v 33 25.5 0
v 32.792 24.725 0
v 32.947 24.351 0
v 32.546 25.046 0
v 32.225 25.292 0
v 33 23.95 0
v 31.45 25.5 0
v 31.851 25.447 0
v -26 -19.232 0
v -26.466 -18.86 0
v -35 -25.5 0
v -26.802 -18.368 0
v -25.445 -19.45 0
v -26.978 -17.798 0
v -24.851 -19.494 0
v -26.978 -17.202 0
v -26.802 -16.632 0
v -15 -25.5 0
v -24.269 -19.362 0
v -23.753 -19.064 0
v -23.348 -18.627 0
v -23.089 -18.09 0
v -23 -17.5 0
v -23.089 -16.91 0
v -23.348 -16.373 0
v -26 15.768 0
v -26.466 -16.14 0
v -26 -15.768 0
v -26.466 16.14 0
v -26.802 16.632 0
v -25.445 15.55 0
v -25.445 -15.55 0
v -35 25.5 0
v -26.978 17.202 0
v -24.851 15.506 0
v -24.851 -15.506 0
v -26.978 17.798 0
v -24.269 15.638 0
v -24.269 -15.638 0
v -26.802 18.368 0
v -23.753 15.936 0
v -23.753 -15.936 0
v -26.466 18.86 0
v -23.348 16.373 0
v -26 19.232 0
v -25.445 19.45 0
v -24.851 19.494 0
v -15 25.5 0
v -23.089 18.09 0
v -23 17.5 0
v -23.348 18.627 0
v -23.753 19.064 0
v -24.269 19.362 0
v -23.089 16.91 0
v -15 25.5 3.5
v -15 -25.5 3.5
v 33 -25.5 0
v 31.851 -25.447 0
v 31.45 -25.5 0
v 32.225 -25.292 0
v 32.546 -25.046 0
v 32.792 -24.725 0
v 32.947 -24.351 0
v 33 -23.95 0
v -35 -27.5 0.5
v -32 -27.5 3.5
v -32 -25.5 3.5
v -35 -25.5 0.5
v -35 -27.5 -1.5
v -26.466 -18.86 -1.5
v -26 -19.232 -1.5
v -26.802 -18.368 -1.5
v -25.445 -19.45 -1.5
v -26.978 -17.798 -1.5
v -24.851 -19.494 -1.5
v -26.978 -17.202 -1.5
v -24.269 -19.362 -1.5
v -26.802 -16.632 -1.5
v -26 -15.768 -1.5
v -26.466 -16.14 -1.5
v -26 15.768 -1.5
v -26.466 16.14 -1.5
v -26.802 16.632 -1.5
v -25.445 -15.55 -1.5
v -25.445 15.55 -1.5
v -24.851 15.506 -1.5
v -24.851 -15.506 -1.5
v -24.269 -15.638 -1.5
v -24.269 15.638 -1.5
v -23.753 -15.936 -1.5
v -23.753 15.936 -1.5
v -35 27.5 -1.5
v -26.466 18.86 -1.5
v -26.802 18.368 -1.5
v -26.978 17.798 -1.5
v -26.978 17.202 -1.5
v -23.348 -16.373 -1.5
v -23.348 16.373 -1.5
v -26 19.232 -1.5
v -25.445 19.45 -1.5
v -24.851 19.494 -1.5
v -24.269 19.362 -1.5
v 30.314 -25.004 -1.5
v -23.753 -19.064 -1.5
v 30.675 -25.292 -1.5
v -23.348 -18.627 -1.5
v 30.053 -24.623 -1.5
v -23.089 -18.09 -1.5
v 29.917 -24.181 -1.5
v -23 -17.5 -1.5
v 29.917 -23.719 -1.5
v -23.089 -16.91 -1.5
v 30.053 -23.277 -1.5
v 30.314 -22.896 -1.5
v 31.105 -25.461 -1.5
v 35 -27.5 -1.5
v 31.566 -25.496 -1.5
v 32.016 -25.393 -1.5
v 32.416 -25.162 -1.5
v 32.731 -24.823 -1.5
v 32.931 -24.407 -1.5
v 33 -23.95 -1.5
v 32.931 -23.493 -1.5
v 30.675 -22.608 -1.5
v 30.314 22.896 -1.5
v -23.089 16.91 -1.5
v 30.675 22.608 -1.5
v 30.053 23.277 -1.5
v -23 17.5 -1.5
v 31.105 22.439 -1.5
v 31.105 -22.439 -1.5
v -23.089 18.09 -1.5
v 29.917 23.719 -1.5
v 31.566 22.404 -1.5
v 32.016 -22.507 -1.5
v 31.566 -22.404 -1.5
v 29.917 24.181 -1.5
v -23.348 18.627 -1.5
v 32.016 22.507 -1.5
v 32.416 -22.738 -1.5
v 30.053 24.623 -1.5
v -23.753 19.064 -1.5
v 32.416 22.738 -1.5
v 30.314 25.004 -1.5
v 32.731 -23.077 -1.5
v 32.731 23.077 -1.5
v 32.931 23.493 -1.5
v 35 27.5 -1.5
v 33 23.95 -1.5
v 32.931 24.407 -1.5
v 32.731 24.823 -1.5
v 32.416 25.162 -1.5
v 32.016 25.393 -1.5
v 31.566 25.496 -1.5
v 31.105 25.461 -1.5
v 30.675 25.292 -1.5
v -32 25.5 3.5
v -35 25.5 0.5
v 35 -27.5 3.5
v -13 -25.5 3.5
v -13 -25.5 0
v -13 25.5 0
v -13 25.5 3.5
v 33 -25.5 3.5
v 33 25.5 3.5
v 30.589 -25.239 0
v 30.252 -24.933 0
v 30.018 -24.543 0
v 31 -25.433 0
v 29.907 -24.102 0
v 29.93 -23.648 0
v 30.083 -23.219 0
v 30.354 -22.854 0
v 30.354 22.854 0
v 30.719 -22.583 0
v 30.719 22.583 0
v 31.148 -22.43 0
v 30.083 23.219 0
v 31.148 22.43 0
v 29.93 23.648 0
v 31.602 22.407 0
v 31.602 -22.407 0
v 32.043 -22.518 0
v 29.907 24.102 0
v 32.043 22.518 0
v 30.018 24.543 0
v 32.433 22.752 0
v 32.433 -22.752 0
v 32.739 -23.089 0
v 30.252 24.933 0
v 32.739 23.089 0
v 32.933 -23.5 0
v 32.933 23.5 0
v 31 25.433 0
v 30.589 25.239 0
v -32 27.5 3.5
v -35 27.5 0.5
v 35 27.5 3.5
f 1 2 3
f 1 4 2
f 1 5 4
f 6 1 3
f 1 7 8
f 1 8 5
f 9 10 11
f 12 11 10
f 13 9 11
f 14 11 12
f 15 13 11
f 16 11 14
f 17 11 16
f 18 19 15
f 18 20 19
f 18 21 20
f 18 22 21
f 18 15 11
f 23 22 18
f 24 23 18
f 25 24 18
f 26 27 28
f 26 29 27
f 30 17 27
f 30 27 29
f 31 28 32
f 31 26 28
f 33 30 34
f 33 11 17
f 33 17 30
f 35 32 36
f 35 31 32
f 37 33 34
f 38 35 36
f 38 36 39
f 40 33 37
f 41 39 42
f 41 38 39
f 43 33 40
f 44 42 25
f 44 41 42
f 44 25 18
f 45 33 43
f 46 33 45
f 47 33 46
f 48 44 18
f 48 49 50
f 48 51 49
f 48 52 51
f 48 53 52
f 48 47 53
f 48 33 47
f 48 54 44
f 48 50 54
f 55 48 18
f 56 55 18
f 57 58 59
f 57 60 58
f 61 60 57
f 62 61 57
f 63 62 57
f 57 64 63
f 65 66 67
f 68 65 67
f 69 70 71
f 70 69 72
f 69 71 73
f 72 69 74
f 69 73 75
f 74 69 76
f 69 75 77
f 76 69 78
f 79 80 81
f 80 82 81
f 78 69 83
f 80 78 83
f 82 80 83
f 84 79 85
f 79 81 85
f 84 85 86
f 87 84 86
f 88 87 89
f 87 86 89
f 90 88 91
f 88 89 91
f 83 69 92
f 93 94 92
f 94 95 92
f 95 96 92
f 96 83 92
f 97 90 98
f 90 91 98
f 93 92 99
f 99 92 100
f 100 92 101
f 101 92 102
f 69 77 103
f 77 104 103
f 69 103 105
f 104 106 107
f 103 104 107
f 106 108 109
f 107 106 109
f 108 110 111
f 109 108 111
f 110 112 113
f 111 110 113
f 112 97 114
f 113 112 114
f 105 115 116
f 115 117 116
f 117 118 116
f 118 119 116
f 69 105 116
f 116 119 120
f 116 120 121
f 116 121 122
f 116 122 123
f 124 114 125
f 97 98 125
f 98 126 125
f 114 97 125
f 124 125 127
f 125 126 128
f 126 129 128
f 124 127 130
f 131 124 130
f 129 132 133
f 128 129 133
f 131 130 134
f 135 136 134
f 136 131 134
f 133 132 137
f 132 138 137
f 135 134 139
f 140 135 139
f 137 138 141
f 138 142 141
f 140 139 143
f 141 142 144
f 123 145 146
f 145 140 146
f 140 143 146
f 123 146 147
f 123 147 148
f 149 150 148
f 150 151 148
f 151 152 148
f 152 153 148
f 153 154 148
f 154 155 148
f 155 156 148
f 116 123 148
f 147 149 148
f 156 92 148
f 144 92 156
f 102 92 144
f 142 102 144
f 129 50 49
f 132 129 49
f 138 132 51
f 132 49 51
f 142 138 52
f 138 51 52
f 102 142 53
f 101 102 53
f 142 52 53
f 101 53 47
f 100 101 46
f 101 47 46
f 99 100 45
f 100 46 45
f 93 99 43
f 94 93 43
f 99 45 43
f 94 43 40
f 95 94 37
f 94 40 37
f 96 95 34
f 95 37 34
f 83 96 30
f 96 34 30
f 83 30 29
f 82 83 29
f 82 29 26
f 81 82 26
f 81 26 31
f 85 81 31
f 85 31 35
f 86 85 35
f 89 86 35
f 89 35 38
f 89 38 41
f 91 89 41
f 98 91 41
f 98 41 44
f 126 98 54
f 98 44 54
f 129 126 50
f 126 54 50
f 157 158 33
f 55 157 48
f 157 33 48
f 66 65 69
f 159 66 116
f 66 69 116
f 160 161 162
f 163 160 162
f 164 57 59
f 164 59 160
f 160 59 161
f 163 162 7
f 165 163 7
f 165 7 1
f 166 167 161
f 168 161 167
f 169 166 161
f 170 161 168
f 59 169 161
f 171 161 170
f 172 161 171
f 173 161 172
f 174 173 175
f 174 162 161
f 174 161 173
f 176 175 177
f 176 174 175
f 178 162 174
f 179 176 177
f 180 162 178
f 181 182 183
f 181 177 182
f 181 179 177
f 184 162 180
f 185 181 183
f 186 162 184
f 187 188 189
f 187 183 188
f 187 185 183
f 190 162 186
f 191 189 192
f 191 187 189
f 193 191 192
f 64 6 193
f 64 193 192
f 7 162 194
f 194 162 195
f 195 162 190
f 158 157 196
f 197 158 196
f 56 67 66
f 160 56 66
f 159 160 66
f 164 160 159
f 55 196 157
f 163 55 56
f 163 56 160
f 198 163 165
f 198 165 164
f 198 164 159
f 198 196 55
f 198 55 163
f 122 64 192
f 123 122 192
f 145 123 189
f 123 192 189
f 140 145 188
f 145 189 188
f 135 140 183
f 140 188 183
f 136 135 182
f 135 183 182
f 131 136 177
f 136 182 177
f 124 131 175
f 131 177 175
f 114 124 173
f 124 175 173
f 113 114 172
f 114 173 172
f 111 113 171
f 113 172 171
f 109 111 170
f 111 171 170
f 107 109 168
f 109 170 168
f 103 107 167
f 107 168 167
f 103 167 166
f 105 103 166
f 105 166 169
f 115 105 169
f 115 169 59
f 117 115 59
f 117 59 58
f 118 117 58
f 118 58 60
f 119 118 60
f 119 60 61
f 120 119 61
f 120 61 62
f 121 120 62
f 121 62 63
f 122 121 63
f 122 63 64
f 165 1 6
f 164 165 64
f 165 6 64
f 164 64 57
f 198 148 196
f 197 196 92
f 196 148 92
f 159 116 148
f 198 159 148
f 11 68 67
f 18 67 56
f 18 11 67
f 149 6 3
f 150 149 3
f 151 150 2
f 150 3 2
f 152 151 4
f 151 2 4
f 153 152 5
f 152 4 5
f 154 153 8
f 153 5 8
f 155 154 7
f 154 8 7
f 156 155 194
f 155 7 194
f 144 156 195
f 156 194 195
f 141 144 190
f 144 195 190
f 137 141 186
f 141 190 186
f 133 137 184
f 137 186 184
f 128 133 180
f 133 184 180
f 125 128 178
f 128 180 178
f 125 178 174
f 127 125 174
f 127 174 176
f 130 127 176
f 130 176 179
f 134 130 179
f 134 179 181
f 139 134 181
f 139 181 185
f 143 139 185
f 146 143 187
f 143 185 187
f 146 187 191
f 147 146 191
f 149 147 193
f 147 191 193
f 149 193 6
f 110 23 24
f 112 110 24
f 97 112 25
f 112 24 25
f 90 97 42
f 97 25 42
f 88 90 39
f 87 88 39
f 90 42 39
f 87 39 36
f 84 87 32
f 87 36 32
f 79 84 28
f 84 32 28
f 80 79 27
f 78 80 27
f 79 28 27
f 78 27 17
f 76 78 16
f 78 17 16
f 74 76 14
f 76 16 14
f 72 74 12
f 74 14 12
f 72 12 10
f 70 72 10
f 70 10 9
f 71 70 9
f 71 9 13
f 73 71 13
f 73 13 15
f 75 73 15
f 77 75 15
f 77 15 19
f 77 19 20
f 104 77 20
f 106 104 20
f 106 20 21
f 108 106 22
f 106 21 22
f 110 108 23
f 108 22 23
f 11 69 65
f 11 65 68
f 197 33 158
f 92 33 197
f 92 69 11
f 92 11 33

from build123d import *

# Parameters (mm, degrees)
F0_W     = 70
F0_H     = 55
F0_R     = 2
F0_R_2   = 1.55
F1_DEPTH = 1.5
F2_W     = 2
F2_H     = 51
F2_H_2   = 2
F2_W_2   = 20
F3_DEPTH = 3.5
F4_SIZE  = 3


with BuildPart() as f1:
    # F0 (on Top) → F1 (new body)
    with BuildSketch(Plane.XY):
        Rectangle(F0_W, F0_H)
        with Locations((-25, -17.5)):
            Circle(F0_R, mode=Mode.SUBTRACT)
        with Locations((31.45, -23.95)):
            Circle(F0_R_2, mode=Mode.SUBTRACT)
        with Locations((-25, 17.5)):
            Circle(F0_R, mode=Mode.SUBTRACT)
        with Locations((31.45, 23.95)):
            Circle(F0_R_2, mode=Mode.SUBTRACT)
    extrude(amount=-F1_DEPTH)

    # F2 (on face) → F3 (join)
    with BuildSketch(Plane.XY):
        with Locations((-14, 0)):
            Rectangle(F2_W, F2_H)
        Polygon((31.45, -25.5), (-13, -25.5), (-13, -27.5), (35, -27.5), (35, 27.5), (-13, 27.5), (-13, 25.5), (31.45, 25.5), (33, 25.5), (33, 23.95), (33, -23.95), (33, -25.5), align=None)
        with Locations((-14, -26.5)):
            Rectangle(F2_W, F2_H_2)
        with Locations((-25, -26.5)):
            Rectangle(F2_W_2, F2_H_2)
        with Locations((-14, 26.5)):
            Rectangle(F2_W, F2_H_2)
        with Locations((-25, 26.5)):
            Rectangle(F2_W_2, F2_H_2)
    extrude(amount=F3_DEPTH)

    # F4
    f4_edges = [f1.edges().sort_by_distance(p)[0] for p in [
        (-35, 26.5, 3.5),
        (-35, -26.5, 3.5),
    ]]
    chamfer(f4_edges, length=F4_SIZE)


solid = f1.part
